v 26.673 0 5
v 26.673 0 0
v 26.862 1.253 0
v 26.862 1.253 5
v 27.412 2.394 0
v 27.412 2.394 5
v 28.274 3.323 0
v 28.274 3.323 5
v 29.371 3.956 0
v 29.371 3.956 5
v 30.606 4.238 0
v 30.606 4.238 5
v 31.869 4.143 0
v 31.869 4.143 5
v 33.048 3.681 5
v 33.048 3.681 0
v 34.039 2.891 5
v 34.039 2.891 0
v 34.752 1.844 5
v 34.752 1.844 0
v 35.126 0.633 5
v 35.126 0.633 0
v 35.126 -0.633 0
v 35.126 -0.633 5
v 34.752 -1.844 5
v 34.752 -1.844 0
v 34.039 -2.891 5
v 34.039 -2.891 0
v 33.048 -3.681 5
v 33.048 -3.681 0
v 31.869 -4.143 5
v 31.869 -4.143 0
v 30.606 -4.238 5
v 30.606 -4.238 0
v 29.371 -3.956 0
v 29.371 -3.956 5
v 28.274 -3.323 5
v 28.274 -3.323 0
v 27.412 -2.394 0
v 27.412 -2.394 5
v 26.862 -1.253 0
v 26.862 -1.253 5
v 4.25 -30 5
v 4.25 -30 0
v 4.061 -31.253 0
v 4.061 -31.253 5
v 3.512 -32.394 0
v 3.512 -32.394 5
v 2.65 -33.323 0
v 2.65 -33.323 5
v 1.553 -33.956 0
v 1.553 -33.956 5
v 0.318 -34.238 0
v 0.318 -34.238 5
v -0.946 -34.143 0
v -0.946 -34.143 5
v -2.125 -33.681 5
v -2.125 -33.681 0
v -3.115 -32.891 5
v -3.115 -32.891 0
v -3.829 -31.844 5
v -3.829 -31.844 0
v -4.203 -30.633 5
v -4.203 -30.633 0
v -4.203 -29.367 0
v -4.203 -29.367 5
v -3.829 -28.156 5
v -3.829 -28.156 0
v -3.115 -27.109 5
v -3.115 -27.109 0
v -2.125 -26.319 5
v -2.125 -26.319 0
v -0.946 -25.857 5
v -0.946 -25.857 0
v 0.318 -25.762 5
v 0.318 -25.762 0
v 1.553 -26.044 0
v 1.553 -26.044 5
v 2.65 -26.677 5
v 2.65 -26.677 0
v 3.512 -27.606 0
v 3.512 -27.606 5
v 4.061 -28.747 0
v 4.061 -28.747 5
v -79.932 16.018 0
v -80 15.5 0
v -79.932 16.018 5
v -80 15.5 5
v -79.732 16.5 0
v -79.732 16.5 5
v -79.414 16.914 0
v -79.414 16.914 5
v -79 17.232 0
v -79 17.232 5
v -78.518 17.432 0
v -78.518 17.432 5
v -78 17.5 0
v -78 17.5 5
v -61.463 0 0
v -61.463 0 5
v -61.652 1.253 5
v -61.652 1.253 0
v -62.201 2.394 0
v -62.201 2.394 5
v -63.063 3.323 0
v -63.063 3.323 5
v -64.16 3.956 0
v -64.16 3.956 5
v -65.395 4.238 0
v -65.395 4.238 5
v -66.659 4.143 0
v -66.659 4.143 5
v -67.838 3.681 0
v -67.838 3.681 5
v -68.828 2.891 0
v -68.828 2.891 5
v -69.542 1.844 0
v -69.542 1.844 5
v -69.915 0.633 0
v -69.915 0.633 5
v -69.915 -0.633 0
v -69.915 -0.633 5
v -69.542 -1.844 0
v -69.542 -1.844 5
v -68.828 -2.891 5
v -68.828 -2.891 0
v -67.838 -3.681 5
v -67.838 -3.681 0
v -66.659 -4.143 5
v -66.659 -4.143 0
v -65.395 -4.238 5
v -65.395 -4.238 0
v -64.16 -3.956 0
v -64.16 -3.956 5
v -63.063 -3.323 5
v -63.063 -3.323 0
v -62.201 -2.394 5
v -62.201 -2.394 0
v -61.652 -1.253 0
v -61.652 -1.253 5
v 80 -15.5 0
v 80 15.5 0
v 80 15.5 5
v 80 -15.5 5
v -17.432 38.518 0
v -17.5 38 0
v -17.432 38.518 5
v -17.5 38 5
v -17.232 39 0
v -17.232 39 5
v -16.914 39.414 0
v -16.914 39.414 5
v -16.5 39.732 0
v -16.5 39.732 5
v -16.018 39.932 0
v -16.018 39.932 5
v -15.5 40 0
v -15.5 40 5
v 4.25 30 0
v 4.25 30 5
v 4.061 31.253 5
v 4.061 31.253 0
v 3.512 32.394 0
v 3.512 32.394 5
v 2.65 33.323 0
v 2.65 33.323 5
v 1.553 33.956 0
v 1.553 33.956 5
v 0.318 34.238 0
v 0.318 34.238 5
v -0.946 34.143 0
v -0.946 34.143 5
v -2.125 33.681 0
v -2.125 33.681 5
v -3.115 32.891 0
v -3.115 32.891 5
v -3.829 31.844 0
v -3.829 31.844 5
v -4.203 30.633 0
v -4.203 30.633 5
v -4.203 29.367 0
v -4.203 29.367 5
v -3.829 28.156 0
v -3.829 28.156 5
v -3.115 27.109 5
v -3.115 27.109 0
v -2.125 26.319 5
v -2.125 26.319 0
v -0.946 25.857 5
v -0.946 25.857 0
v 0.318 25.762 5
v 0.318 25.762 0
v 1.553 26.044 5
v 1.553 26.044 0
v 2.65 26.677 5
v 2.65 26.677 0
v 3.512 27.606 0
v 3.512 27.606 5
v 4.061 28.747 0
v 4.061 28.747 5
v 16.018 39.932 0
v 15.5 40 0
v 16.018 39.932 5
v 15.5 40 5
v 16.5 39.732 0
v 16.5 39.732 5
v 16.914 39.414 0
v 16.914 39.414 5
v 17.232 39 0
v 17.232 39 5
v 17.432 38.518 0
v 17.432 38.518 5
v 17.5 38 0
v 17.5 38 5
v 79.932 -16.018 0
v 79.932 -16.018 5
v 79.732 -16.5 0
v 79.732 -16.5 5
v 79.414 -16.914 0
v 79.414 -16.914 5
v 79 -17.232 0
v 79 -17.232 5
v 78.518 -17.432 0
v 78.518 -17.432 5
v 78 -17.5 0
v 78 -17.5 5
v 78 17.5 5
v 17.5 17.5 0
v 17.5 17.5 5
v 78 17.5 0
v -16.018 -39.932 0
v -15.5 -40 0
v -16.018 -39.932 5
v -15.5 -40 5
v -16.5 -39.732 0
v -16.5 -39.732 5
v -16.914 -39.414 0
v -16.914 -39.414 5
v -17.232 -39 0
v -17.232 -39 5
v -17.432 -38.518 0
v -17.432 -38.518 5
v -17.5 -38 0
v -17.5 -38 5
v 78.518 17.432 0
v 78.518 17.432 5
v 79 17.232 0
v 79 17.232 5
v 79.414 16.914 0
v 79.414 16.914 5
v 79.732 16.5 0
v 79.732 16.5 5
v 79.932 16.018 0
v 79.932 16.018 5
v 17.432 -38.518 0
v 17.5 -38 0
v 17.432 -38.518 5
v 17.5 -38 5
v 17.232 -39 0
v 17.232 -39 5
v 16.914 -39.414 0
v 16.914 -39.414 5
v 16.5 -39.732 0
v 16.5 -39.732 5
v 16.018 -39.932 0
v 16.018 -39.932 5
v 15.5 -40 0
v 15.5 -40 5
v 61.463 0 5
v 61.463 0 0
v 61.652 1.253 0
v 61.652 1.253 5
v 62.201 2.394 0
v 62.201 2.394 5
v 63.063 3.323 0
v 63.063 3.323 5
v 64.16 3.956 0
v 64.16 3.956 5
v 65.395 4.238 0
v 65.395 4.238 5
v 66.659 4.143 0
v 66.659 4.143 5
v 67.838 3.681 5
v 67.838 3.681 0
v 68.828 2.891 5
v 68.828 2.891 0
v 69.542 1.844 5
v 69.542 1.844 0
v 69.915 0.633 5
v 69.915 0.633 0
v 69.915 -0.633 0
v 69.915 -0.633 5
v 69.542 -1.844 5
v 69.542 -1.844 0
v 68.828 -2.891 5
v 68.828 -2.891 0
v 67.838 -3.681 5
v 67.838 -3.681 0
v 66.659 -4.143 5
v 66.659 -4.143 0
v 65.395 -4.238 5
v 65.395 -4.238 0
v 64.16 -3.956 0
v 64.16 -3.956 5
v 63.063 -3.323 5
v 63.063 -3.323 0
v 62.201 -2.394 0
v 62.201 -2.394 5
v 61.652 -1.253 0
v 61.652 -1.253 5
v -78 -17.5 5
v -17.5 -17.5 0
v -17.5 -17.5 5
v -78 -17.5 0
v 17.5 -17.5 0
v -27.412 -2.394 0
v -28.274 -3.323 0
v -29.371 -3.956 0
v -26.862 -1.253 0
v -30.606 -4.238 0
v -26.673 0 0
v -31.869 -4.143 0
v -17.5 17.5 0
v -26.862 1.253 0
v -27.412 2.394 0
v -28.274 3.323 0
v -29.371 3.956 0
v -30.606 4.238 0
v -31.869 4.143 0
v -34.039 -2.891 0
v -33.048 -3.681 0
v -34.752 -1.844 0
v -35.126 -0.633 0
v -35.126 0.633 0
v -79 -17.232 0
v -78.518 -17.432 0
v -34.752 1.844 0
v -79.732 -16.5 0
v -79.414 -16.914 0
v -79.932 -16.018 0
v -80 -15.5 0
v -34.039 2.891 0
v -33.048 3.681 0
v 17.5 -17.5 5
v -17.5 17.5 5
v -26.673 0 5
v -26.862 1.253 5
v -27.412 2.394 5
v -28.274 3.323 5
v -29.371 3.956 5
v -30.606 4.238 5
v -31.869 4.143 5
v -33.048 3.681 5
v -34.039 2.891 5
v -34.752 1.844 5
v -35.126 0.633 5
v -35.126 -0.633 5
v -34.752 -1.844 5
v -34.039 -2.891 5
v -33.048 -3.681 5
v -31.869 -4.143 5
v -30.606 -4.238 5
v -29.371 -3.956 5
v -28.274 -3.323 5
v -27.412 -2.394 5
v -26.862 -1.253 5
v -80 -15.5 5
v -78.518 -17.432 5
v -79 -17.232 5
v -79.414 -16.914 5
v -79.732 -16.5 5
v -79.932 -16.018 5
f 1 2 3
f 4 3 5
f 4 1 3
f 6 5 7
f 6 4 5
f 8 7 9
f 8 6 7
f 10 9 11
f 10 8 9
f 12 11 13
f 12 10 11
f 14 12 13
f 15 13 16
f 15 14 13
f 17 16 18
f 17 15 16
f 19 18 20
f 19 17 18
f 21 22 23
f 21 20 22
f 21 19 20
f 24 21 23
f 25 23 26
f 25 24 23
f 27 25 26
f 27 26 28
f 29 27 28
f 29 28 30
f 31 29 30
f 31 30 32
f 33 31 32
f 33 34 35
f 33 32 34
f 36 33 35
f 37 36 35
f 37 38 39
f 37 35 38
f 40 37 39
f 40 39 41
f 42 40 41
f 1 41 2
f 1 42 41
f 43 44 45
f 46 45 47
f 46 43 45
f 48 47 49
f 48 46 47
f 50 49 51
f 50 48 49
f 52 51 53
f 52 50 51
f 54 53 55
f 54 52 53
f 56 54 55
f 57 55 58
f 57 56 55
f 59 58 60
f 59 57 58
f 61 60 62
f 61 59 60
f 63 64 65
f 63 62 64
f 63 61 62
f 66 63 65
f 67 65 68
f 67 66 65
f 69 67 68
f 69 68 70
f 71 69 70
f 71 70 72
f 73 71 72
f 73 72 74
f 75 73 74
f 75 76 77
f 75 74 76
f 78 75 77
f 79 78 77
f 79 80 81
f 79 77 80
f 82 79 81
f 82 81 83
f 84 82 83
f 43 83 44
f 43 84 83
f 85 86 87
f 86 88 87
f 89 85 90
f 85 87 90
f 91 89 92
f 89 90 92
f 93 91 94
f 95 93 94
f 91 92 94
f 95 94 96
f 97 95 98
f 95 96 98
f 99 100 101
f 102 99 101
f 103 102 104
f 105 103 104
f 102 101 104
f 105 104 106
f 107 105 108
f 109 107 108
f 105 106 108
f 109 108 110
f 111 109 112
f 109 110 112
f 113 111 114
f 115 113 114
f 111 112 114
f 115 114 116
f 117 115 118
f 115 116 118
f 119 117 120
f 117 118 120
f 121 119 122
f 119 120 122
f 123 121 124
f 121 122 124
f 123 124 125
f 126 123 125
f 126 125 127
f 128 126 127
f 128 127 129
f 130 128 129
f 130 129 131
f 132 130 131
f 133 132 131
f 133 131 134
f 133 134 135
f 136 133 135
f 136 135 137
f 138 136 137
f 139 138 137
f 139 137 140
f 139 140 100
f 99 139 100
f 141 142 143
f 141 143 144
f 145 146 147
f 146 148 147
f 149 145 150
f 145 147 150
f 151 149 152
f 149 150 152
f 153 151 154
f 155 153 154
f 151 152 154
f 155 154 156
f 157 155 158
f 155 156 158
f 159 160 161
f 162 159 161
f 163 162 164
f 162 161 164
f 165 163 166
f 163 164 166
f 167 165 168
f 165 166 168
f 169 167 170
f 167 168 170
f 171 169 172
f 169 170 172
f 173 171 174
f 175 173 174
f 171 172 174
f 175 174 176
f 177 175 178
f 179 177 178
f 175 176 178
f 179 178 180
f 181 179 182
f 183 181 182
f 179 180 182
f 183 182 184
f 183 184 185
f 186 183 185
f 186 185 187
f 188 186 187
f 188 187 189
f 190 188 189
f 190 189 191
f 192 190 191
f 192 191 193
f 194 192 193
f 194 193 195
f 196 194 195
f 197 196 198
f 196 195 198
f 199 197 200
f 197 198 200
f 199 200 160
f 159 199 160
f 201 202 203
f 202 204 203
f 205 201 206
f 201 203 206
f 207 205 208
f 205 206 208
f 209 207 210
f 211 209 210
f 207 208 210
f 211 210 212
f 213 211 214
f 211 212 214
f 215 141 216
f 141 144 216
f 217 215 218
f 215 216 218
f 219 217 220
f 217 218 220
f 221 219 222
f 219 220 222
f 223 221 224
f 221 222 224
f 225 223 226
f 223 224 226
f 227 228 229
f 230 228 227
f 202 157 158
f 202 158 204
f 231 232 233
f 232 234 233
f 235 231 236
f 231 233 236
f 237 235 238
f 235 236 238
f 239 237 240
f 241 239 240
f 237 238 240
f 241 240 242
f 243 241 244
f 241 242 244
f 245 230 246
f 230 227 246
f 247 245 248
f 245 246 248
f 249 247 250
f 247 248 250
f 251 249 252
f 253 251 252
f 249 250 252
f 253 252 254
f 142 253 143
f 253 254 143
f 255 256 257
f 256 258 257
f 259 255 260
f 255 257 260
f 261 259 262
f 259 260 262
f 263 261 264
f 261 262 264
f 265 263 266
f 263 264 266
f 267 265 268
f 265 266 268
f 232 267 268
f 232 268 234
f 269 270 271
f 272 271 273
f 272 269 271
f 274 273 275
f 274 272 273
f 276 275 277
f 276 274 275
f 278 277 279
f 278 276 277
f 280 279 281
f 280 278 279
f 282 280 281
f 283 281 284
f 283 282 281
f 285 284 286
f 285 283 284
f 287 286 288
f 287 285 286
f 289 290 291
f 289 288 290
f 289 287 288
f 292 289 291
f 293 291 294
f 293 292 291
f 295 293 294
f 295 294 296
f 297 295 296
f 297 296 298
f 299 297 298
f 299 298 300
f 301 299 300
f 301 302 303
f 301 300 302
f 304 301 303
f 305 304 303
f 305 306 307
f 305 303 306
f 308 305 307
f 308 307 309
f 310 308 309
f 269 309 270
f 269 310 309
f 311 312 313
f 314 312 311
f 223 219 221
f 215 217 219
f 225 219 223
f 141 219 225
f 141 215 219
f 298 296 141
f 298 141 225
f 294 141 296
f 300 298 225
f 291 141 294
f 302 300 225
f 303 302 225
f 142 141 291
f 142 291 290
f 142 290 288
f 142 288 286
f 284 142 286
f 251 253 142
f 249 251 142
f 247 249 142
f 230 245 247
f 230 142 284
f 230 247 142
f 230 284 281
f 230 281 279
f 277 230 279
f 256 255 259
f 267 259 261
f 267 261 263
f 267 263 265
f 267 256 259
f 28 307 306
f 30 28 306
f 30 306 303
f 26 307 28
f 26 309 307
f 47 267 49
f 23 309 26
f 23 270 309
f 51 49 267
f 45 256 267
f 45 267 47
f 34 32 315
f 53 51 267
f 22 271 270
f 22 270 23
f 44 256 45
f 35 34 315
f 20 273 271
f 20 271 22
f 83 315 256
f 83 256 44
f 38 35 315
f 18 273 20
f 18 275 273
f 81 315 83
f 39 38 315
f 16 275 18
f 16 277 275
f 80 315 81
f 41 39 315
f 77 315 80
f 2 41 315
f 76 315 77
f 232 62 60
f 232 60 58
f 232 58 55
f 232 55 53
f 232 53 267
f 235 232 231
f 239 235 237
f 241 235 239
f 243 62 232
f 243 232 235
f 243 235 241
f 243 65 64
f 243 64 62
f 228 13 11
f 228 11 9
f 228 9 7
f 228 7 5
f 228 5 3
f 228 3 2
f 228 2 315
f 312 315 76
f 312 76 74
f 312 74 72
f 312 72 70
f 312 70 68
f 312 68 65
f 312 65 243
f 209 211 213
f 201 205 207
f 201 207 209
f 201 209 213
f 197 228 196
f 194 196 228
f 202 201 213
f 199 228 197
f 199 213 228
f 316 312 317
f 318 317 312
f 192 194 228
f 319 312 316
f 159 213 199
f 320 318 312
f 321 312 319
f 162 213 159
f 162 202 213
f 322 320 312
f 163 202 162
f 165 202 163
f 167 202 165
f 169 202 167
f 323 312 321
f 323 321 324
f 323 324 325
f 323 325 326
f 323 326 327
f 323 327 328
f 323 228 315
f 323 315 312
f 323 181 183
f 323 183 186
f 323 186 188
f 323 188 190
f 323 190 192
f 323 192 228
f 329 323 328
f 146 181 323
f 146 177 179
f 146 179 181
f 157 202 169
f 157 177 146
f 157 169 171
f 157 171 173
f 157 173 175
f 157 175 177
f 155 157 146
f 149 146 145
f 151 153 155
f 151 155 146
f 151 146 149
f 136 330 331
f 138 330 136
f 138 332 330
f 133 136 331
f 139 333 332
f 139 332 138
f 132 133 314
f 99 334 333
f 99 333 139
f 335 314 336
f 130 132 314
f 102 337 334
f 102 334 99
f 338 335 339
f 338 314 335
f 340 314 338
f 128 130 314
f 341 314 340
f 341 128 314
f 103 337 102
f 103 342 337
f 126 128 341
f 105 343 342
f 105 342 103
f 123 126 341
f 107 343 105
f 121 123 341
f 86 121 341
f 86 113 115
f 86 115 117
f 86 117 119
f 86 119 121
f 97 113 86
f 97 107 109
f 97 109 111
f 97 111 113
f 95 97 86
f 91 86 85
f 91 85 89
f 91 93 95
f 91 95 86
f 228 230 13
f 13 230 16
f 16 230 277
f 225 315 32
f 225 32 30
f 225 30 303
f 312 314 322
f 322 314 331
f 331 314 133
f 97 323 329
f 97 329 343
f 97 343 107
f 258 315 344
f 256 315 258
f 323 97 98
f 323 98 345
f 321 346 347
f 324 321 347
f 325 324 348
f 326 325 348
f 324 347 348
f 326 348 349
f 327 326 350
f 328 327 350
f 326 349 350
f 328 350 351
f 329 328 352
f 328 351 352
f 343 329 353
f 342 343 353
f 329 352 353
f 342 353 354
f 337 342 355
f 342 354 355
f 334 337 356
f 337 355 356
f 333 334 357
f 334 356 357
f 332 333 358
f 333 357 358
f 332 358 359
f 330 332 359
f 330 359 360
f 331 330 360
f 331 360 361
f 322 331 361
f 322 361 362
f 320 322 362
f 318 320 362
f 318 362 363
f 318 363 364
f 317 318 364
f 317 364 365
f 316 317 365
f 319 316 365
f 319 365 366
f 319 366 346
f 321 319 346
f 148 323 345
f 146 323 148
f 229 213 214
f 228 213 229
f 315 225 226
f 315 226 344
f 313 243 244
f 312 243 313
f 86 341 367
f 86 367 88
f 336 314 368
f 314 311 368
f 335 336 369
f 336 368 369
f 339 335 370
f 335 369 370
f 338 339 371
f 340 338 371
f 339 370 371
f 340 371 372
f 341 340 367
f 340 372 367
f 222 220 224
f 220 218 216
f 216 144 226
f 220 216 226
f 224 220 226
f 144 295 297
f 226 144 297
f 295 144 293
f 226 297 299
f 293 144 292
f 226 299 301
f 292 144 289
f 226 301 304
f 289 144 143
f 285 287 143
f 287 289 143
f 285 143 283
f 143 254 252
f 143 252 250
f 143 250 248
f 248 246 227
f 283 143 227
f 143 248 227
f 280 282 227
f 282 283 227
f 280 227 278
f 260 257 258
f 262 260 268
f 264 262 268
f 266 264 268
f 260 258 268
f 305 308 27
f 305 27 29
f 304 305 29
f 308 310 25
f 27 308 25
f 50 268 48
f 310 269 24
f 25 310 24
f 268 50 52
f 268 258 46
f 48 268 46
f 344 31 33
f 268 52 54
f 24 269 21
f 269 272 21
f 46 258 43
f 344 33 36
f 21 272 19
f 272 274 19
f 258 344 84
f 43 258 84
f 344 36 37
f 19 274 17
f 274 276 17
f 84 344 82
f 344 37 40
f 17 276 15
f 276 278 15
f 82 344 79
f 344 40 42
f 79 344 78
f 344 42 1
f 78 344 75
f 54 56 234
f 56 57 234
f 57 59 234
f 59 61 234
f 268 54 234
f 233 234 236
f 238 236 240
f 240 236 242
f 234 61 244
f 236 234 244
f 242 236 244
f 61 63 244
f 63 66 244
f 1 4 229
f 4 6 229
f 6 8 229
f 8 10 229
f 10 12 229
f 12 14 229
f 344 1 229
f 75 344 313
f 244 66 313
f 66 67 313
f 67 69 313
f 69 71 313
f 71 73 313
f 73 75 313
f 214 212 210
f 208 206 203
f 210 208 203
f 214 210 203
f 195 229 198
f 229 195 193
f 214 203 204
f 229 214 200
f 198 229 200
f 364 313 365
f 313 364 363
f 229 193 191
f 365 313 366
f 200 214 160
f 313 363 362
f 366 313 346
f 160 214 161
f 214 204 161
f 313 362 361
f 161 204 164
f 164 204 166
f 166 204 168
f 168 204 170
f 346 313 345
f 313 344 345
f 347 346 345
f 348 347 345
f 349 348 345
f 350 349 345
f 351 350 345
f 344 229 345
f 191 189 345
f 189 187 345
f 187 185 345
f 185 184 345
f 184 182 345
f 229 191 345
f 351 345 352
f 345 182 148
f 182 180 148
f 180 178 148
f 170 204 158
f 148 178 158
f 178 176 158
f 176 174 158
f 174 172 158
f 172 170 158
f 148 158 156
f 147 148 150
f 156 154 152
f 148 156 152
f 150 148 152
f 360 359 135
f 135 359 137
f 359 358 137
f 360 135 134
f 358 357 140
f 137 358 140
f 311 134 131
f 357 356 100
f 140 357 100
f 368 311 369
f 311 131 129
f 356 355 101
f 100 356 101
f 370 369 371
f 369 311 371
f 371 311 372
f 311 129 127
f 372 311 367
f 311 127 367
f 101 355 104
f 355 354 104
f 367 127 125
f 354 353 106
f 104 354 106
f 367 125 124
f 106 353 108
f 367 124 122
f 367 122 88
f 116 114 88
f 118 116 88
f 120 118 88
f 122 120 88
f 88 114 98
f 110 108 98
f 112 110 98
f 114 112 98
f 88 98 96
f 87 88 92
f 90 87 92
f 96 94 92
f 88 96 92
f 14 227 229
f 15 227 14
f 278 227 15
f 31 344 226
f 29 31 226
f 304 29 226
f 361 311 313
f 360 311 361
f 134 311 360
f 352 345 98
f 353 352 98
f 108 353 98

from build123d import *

# Parameters (mm, degrees)
EXTRUDE_1_DEPTH     = 5
FILLET_1_R          = 2
SKETCH_2_R          = 4.25
CUT_EXTRUDE_1_DEPTH = 90.582364336


with BuildPart() as part:
    # 草图1 → 凸台-拉伸1 (new body)
    with BuildSketch(Plane.XY):
        Polygon((17.5, 17.5), (80, 17.5), (80, -17.5), (17.5, -17.5), (17.5, -40), (-17.5, -40), (-17.5, -17.5), (-80, -17.5), (-80, 17.5), (-17.5, 17.5), (-17.5, 40), (17.5, 40), align=None)
    extrude(amount=EXTRUDE_1_DEPTH)

    # 圆角1
    fillet_1_edges = [part.edges().sort_by_distance(p)[0] for p in [
        (80, -17.5, 2.5),
        (17.5, -40, 2.5),
        (-17.5, -40, 2.5),
        (-80, -17.5, 2.5),
        (-80, 17.5, 2.5),
        (-17.5, 40, 2.5),
        (17.5, 40, 2.5),
        (80, 17.5, 2.5),
    ]]
    fillet(fillet_1_edges, radius=FILLET_1_R)

    # 草图2 → 切除-拉伸1 (cut, through all)
    with BuildSketch(Plane.XY.offset(5)):
        with Locations((0, 30)):
            Circle(SKETCH_2_R)
        with Locations((-65.712823547, 0)):
            Circle(SKETCH_2_R)
        with Locations((-30.923378323, 0)):
            Circle(SKETCH_2_R)
    cut_extrude_1 = extrude(amount=-CUT_EXTRUDE_1_DEPTH, mode=Mode.SUBTRACT)

    # 镜向1: 切除-拉伸1 across plane
    add(cut_extrude_1.mirror(Plane.ZX), mode=Mode.SUBTRACT)

    # 镜向2: 切除-拉伸1 across plane
    add(cut_extrude_1.mirror(Plane(origin=(0, 0, 0), x_dir=(0, 0, 1), z_dir=(1, 0, 0))), mode=Mode.SUBTRACT)


solid = part.part
